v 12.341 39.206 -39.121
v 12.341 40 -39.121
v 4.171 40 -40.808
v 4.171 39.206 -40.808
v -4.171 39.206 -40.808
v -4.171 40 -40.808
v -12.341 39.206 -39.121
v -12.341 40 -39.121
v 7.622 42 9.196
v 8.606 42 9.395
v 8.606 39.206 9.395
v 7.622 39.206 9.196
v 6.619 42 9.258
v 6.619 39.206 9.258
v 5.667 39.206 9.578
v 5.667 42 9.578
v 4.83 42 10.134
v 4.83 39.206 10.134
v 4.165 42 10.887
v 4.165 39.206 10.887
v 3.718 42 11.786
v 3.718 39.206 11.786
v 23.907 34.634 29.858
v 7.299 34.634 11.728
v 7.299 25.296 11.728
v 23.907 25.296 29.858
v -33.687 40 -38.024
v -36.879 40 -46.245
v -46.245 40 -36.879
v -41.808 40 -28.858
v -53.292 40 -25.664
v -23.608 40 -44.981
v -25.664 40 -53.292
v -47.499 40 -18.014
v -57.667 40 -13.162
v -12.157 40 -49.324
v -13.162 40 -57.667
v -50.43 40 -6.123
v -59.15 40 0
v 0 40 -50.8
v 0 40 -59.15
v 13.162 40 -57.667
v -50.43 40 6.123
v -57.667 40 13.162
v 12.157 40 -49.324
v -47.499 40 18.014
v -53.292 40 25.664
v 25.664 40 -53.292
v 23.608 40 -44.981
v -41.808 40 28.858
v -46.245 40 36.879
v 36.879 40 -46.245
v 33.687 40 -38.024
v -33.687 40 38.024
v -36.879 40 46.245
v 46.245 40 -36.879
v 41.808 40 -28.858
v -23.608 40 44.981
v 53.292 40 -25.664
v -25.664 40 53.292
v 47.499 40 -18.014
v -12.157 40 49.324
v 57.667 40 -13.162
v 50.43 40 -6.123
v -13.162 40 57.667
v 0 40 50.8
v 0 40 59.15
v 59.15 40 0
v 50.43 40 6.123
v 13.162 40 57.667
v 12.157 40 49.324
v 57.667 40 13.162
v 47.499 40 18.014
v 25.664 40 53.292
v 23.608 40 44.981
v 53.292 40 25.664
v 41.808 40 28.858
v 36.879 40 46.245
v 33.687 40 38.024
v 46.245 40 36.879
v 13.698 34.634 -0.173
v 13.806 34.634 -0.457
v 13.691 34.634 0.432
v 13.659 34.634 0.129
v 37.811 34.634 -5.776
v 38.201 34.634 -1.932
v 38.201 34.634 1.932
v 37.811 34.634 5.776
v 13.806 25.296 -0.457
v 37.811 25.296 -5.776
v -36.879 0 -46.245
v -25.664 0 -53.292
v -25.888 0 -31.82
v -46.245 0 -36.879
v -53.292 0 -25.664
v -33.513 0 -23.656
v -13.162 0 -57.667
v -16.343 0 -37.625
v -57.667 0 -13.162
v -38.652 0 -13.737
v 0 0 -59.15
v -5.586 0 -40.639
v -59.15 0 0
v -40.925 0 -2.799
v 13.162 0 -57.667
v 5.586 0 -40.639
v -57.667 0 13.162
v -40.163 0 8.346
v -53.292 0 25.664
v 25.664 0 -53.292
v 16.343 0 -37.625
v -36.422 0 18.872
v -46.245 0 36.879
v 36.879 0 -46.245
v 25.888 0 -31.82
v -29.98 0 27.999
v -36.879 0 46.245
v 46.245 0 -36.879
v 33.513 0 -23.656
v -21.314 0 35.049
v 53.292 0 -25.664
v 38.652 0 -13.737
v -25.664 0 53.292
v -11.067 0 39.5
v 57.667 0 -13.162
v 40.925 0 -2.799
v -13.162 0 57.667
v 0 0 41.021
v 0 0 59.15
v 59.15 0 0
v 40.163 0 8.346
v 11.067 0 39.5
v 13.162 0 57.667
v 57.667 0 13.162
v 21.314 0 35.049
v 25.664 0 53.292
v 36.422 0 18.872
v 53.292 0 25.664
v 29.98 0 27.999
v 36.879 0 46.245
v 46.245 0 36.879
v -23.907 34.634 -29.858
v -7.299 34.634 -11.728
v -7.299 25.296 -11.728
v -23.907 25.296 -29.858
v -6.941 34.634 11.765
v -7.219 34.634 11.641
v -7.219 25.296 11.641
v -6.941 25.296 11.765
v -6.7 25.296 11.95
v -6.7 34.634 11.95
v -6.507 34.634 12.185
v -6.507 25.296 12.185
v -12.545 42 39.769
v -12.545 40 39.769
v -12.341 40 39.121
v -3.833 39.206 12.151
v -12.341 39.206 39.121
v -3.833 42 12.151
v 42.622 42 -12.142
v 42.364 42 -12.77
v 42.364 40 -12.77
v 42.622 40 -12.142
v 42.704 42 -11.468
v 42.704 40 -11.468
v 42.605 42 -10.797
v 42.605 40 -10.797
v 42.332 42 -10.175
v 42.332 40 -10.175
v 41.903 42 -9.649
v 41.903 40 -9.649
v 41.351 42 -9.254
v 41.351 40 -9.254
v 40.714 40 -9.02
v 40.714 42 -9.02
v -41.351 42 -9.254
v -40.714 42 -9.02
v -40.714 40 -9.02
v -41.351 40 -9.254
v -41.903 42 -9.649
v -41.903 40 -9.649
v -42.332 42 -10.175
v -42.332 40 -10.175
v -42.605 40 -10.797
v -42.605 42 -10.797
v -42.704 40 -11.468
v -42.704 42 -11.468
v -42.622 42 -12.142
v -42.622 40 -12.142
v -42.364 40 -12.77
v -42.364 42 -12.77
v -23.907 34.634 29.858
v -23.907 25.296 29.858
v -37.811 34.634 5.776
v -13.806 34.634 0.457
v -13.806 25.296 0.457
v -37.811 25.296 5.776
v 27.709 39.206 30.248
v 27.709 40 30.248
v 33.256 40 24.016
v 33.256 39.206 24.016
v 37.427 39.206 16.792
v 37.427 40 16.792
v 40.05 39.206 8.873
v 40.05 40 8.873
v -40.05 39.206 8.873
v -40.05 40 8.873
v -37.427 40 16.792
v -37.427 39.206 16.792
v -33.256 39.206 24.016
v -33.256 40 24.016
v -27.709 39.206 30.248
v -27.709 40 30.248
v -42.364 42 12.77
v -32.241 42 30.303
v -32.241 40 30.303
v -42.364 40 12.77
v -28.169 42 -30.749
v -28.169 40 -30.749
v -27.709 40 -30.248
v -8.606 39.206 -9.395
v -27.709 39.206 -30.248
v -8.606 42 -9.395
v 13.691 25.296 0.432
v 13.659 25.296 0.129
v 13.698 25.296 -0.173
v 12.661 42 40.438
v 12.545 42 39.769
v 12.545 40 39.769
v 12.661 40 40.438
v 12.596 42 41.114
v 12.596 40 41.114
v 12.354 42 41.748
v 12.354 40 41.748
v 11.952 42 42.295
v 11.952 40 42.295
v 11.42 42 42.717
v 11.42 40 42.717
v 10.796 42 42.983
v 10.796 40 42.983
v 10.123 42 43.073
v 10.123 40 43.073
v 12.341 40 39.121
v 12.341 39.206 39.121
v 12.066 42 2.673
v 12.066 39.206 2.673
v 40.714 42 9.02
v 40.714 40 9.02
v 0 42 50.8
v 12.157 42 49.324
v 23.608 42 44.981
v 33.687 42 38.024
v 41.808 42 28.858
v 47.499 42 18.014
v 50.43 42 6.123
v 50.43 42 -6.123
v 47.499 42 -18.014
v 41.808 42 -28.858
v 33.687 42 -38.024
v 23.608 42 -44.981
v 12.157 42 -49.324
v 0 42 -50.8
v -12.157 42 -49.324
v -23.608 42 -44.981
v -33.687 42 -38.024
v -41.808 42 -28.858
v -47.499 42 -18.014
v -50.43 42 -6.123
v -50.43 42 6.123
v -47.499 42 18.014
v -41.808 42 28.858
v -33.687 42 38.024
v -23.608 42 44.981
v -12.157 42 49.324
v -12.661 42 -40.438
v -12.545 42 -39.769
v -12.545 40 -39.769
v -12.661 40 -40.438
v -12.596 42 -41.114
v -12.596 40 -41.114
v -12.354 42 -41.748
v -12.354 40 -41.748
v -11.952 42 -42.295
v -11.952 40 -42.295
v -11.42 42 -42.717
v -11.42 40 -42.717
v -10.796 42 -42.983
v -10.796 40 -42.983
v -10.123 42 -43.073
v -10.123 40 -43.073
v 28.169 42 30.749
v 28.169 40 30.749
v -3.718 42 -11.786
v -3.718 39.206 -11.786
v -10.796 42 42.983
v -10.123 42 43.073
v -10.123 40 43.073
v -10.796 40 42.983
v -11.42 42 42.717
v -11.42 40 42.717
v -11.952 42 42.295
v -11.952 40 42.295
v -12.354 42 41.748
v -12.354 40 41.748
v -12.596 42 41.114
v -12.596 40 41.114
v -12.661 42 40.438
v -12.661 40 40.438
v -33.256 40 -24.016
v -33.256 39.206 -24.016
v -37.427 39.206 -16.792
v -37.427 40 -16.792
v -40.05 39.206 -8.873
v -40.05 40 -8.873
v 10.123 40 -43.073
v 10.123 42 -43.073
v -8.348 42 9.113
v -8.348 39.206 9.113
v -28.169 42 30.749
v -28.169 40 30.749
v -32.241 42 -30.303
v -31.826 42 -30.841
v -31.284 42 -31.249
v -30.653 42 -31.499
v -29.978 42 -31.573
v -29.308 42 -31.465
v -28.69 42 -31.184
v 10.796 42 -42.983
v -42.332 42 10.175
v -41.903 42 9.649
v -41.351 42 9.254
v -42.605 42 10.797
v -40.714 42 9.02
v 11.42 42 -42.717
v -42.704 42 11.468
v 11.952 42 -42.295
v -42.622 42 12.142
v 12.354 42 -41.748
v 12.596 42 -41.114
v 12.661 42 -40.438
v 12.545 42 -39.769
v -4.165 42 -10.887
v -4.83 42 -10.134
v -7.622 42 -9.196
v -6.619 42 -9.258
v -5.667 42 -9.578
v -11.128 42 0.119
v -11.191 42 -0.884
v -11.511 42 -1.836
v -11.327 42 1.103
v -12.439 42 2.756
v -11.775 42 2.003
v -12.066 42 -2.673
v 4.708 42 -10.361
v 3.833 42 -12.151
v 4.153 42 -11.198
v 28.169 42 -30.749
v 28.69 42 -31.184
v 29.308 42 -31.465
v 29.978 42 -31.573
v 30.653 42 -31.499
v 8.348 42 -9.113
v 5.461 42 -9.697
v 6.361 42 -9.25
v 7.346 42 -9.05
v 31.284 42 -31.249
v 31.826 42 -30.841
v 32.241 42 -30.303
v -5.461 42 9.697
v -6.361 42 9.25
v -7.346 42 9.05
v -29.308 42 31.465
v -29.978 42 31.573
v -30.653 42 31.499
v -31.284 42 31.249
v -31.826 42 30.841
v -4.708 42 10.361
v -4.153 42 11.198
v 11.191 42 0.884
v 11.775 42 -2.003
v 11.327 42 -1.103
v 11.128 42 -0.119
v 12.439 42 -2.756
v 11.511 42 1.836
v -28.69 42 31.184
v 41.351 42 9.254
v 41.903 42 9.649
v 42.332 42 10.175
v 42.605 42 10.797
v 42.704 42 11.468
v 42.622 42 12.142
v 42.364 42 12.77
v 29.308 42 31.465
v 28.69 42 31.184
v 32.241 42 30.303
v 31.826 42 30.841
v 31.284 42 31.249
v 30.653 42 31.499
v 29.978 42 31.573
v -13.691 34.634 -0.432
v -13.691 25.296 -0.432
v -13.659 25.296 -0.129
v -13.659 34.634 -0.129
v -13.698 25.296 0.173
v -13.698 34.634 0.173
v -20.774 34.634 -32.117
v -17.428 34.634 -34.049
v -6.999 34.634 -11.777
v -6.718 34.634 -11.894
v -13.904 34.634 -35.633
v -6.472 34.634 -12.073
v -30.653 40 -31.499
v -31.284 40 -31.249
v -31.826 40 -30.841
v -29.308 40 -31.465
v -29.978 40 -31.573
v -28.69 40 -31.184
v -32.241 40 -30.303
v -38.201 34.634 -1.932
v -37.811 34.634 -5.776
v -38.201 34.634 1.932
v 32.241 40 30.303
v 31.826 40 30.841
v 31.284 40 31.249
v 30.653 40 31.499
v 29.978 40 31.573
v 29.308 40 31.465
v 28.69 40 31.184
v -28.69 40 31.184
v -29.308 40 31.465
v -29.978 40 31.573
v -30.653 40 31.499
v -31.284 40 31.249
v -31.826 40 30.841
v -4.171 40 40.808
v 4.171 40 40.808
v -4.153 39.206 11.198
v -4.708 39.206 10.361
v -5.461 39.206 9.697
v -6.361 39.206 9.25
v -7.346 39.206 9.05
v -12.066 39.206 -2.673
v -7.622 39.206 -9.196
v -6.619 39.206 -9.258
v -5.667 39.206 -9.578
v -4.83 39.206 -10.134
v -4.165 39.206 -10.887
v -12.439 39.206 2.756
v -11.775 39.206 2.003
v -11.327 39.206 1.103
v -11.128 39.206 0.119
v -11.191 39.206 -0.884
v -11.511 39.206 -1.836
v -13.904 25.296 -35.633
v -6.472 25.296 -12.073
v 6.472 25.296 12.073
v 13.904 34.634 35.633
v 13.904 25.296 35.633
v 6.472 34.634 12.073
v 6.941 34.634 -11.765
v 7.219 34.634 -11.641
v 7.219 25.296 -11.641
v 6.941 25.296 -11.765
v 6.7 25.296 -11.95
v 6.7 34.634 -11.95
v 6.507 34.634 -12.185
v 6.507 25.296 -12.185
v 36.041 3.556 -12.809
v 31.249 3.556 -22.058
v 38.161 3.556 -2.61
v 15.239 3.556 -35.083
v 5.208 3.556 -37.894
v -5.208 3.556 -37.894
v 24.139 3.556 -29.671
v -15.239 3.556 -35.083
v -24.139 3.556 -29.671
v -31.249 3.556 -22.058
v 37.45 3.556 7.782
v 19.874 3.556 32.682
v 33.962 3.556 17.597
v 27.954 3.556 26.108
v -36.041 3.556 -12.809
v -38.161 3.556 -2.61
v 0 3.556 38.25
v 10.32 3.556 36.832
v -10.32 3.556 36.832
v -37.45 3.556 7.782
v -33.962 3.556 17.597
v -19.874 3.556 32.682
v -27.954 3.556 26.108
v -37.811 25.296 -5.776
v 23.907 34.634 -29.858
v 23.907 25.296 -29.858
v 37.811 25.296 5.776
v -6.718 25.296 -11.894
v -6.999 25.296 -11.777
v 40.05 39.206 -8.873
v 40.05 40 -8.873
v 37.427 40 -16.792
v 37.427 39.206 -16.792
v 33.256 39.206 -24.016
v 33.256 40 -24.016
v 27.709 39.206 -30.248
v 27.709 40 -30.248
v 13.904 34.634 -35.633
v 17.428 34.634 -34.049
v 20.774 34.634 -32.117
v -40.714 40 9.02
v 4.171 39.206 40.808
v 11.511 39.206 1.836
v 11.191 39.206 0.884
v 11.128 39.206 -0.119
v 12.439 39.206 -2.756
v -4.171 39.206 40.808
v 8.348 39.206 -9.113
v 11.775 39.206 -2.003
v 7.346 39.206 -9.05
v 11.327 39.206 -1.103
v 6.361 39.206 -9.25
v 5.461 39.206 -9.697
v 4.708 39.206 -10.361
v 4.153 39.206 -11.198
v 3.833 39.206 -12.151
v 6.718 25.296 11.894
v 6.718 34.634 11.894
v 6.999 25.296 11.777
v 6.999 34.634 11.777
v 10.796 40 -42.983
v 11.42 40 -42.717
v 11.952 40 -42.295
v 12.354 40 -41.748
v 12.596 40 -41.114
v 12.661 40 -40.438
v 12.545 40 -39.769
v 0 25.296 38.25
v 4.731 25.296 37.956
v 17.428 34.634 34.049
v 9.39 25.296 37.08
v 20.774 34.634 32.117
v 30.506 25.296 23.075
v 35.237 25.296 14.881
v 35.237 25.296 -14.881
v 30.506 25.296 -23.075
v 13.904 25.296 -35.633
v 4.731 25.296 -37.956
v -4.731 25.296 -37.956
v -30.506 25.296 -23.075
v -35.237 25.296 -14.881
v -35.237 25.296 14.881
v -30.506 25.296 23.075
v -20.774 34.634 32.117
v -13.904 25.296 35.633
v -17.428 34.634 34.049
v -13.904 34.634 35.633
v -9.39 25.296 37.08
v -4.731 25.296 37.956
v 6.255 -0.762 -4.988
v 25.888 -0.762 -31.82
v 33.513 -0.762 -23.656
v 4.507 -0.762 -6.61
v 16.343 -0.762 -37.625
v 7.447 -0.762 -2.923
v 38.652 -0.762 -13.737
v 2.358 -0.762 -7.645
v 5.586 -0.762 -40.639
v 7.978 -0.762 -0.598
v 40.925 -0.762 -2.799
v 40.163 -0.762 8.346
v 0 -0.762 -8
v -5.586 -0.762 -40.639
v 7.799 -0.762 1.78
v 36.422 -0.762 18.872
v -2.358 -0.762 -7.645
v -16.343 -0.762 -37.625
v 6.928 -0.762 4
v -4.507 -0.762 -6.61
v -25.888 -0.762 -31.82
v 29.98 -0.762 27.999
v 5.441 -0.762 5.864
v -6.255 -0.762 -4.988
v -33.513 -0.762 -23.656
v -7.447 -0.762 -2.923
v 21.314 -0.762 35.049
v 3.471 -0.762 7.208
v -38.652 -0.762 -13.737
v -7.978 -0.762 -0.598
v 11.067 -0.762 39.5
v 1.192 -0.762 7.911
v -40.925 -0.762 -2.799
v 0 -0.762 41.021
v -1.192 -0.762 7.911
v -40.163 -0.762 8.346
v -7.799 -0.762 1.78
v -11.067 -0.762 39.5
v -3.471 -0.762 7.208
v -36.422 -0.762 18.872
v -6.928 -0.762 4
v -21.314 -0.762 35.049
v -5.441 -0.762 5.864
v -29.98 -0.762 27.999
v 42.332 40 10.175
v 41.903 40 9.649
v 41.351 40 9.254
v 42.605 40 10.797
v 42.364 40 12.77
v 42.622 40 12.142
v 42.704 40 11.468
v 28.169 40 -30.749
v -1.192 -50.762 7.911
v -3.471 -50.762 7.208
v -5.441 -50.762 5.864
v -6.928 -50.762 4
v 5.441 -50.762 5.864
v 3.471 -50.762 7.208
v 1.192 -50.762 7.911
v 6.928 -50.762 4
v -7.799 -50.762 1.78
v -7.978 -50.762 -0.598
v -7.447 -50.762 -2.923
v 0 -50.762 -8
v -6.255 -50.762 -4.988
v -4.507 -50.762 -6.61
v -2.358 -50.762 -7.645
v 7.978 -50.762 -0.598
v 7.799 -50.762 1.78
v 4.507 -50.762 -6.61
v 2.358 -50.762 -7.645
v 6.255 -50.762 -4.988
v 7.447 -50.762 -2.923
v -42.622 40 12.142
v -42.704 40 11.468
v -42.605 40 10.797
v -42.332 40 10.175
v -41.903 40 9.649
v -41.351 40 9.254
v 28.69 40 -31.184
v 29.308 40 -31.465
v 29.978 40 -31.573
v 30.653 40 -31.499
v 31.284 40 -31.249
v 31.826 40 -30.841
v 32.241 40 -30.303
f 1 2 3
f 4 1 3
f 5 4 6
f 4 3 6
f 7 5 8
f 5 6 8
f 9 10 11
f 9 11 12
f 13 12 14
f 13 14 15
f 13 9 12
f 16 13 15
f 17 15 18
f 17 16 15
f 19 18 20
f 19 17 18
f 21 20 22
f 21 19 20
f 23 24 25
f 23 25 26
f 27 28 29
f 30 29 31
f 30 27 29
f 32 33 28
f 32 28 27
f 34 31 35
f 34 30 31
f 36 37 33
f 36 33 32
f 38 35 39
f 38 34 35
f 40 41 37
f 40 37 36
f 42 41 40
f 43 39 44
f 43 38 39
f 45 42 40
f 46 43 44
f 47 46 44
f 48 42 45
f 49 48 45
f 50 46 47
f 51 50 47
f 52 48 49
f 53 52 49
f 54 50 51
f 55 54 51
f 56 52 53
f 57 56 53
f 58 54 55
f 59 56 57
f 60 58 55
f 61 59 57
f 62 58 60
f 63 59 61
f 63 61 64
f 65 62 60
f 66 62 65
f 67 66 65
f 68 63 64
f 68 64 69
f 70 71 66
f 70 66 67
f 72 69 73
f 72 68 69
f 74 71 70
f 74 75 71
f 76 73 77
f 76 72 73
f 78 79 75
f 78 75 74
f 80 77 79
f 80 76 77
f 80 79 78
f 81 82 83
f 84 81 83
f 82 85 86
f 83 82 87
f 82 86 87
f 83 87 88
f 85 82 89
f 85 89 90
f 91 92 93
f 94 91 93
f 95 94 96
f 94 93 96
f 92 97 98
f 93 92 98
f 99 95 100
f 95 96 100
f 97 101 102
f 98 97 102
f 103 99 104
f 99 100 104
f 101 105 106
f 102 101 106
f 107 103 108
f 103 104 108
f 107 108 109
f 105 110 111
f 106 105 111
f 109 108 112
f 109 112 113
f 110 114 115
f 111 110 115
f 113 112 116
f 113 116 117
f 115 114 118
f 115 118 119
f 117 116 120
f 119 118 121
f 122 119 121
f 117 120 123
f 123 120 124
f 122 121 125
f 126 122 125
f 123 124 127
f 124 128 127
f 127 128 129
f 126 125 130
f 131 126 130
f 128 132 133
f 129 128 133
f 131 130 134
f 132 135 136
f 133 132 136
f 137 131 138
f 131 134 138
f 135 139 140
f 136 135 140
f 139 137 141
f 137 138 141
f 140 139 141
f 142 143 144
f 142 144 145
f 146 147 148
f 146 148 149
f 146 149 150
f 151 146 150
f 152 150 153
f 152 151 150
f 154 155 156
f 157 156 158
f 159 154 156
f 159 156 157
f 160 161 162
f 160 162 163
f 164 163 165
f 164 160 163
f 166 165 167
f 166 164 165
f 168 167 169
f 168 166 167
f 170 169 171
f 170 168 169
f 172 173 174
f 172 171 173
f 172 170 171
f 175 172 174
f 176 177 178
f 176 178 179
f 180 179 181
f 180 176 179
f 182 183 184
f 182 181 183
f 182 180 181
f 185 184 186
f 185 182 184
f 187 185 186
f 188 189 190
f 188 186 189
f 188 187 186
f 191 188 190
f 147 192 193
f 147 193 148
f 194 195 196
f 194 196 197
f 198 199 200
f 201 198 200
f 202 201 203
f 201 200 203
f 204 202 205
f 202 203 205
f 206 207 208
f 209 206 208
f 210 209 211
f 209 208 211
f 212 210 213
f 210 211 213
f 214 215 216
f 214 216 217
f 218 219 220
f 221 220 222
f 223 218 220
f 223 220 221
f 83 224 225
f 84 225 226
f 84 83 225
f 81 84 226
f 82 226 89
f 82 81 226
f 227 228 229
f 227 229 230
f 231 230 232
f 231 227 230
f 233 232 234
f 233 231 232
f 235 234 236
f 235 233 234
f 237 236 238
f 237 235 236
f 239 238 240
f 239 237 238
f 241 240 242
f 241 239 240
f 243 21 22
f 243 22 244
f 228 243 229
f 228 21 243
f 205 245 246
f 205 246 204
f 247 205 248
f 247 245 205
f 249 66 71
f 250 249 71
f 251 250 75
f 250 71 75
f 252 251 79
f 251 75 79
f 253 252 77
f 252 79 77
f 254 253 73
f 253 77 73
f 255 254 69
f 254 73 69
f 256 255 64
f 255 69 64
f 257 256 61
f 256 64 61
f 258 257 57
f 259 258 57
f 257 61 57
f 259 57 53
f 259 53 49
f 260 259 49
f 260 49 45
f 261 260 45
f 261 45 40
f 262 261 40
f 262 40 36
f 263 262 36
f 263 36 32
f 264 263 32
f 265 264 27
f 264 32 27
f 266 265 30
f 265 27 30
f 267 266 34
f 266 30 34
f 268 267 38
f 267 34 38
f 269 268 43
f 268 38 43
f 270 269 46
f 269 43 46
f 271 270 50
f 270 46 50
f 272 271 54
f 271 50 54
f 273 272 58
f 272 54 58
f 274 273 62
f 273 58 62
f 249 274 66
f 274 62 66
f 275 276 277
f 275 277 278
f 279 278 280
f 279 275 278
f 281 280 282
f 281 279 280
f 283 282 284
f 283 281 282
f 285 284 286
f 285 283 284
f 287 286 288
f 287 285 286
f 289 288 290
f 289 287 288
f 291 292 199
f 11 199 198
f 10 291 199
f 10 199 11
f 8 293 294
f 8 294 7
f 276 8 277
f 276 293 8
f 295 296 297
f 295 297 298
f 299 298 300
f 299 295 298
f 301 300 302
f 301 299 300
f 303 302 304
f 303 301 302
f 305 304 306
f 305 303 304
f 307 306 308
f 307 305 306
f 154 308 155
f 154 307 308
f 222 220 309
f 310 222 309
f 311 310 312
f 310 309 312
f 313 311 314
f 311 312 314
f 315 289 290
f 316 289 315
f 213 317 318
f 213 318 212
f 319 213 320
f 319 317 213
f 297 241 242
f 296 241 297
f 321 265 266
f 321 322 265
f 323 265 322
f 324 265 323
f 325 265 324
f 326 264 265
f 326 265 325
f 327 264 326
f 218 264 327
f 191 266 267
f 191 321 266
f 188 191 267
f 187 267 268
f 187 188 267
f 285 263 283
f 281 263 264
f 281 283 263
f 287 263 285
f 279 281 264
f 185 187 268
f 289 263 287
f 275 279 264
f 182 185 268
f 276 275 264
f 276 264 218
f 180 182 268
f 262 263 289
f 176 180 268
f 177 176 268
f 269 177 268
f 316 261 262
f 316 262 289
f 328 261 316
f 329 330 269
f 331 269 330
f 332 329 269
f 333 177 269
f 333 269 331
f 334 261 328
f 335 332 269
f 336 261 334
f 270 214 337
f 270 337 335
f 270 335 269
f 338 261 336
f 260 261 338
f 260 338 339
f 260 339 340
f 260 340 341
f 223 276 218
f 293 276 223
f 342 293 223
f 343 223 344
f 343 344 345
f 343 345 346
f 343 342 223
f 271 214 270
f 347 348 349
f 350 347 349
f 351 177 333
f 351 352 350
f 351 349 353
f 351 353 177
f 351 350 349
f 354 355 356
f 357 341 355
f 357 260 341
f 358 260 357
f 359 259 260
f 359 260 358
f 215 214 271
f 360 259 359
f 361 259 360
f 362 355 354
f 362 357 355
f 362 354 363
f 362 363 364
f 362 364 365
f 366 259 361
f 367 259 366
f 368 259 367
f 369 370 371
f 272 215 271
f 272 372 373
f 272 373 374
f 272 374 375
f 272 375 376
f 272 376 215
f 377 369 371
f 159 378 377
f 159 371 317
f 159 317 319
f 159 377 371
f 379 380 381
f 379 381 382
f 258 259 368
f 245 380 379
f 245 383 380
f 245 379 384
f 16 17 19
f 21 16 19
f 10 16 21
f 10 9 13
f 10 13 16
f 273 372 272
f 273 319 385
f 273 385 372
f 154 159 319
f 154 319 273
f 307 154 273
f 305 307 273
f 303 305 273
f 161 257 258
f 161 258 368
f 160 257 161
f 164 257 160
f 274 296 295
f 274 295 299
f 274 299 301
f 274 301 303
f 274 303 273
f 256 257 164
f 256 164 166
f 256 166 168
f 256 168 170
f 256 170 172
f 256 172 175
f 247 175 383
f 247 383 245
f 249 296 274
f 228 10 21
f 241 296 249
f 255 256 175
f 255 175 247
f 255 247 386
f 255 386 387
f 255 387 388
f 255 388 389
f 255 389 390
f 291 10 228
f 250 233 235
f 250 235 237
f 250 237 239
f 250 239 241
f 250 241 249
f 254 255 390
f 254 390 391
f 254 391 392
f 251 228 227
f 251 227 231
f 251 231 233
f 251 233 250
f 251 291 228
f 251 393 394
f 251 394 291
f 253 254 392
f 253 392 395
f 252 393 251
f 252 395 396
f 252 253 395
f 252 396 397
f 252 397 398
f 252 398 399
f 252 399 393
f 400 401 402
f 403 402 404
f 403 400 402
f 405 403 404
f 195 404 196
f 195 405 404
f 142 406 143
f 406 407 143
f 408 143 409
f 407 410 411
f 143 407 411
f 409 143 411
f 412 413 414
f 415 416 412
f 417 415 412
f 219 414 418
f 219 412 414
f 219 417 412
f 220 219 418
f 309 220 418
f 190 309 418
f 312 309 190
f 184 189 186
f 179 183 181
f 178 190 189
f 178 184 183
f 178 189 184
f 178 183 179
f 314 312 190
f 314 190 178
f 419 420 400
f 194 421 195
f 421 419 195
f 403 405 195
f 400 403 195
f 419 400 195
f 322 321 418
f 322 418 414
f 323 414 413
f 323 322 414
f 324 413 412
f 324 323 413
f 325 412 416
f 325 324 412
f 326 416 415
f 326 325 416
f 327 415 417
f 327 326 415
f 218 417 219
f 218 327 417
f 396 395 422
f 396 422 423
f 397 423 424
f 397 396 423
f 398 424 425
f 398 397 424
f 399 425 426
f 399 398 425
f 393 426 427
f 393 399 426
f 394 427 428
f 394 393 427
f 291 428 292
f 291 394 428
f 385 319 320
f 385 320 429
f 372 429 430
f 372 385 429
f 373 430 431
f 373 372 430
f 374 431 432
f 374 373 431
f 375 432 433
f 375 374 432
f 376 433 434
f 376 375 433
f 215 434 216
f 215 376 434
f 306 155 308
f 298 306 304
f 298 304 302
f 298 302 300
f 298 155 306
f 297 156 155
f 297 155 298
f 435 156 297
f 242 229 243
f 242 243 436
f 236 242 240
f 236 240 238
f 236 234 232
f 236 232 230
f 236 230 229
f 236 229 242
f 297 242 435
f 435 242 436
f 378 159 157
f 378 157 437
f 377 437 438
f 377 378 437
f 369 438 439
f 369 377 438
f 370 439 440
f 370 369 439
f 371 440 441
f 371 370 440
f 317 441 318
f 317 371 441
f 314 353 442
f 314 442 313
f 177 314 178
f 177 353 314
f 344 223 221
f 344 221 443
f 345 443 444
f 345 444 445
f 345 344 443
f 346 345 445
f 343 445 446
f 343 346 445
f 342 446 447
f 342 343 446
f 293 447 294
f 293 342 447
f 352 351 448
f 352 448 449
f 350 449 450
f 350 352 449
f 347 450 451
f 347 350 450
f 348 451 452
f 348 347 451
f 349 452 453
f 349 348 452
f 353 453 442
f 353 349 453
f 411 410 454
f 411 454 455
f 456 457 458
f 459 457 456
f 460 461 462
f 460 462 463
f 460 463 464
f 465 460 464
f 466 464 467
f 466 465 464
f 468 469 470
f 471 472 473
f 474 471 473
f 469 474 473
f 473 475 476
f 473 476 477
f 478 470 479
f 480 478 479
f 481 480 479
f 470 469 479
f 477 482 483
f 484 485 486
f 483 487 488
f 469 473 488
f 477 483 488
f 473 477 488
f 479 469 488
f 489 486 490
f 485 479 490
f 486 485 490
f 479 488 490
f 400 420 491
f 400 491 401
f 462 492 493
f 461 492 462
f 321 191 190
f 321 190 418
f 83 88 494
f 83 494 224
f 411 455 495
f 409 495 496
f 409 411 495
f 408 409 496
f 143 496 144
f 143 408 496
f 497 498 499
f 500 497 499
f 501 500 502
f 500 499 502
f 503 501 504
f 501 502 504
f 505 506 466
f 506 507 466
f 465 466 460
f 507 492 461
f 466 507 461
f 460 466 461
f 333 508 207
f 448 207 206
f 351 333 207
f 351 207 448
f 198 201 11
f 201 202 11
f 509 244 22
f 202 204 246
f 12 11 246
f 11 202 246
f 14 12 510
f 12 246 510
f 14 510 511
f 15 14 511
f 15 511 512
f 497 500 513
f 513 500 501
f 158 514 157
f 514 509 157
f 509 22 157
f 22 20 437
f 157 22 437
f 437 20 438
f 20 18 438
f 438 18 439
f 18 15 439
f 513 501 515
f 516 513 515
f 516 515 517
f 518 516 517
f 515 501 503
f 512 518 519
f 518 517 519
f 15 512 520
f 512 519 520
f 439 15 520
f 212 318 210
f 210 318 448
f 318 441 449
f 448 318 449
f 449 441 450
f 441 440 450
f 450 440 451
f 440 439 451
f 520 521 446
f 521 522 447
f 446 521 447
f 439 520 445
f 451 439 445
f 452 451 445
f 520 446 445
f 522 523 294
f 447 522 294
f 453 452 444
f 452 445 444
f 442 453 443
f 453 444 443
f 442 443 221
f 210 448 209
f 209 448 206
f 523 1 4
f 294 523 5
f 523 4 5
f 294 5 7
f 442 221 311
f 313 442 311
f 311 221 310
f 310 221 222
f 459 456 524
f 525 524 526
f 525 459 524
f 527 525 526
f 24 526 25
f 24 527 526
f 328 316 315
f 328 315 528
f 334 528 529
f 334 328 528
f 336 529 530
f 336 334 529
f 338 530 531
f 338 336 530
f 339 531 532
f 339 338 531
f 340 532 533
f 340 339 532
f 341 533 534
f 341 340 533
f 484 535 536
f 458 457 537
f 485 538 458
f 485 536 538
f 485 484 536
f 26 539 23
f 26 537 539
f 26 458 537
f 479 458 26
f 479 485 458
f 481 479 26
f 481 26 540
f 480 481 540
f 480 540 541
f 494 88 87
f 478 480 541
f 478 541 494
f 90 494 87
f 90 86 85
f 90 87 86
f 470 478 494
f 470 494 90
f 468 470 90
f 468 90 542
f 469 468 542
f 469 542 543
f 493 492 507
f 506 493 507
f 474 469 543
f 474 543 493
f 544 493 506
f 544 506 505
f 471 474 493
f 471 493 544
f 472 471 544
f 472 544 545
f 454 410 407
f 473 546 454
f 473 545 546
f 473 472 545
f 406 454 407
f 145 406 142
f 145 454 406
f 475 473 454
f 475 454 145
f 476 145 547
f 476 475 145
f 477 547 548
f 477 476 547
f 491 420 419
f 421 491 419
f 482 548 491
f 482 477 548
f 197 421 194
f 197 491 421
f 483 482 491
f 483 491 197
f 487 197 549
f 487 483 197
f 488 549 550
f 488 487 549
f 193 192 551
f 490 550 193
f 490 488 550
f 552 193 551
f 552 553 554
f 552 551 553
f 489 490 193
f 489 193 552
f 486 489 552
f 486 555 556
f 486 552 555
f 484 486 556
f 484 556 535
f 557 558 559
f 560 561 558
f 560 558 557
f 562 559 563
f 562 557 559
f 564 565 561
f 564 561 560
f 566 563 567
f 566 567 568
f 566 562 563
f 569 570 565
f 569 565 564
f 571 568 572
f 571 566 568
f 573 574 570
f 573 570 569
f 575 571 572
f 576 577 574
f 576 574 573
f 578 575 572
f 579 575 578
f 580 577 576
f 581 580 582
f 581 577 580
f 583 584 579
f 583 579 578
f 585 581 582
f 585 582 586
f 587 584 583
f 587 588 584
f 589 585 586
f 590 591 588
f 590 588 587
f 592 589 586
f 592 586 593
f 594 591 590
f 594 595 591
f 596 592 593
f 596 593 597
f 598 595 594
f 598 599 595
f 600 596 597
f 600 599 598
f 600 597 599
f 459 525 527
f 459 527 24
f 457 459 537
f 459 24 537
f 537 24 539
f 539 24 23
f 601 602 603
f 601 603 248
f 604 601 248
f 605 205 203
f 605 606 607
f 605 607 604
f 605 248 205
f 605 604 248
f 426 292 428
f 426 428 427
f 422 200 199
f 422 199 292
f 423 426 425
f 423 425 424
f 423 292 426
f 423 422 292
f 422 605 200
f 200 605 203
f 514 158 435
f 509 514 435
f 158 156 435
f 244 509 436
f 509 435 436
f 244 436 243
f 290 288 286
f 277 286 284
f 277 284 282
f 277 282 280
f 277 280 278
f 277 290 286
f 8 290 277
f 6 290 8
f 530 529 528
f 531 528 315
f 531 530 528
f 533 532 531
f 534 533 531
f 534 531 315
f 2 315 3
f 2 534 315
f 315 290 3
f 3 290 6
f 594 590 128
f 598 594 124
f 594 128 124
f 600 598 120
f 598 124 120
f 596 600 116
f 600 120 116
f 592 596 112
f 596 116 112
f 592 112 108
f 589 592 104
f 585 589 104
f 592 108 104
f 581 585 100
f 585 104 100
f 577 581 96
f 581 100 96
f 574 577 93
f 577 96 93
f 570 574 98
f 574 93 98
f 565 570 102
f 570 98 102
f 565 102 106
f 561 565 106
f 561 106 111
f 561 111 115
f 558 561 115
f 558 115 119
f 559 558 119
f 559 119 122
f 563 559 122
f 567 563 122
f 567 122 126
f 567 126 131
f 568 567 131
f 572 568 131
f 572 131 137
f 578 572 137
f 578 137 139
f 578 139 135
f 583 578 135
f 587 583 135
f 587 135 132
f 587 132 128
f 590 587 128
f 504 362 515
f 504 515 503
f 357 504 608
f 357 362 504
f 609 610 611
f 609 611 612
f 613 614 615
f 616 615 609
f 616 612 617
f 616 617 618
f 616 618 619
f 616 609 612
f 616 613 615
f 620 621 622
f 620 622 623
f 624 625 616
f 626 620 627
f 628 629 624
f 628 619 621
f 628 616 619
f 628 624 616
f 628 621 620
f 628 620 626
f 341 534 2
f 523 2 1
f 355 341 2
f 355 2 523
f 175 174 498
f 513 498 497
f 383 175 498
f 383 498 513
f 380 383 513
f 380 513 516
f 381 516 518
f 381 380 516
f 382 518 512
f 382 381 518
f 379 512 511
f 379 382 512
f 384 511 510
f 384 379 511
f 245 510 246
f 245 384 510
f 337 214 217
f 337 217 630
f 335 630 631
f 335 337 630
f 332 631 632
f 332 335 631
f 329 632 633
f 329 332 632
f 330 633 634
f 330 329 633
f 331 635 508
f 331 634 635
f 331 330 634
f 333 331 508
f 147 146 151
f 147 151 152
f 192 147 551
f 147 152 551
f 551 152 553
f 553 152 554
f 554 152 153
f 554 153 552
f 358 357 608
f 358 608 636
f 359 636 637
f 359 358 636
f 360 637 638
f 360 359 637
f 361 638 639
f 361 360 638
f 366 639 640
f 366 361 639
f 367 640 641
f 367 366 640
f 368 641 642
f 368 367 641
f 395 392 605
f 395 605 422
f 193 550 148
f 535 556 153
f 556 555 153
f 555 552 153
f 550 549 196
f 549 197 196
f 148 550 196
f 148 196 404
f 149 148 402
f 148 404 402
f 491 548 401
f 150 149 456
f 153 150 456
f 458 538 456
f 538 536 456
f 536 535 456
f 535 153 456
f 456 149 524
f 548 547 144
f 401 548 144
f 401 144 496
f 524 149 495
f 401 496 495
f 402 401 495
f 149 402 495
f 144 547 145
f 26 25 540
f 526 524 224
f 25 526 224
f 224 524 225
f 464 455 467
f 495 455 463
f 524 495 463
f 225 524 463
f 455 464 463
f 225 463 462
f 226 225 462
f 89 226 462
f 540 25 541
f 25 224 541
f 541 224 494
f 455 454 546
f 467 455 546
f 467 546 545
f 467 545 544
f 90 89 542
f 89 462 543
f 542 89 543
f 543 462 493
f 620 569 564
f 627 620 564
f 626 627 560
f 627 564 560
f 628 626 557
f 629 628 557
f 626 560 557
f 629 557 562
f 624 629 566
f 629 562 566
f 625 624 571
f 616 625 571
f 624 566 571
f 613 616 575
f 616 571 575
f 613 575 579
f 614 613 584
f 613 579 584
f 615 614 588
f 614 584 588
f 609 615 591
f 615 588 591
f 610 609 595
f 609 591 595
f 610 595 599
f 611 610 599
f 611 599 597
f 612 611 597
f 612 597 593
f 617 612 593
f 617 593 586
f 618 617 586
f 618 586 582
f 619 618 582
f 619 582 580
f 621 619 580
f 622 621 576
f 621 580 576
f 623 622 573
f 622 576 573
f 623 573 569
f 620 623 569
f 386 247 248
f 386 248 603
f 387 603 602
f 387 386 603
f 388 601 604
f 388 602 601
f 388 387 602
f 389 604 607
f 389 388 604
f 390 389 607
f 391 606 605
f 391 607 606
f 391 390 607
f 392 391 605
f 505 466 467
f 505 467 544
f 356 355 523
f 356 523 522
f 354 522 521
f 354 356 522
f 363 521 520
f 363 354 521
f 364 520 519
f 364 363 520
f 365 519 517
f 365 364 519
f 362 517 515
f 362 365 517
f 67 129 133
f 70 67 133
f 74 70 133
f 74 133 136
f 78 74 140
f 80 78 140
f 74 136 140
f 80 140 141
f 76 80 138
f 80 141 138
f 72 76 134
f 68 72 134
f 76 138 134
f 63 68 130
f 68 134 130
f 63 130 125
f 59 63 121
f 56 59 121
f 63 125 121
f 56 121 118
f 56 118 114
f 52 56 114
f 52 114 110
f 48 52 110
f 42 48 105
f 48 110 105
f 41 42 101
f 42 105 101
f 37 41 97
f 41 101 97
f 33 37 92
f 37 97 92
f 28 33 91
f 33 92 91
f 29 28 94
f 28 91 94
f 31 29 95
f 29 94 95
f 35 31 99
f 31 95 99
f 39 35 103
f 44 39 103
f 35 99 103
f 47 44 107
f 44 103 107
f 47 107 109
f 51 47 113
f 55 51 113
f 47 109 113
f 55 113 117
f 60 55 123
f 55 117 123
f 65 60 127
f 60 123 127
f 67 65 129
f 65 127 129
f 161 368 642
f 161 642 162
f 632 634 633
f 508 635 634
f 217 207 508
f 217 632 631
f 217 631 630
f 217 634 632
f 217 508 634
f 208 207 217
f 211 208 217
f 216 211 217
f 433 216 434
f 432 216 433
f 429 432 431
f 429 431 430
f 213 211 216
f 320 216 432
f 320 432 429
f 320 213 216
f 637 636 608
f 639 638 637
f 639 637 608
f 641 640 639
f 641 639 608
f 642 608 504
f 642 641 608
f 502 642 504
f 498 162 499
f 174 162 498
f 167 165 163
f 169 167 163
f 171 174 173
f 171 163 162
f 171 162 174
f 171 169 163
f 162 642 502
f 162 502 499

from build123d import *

# Parameters (mm, degrees)
SKETCH3_R           = 59.15
SKETCH3_R_2         = 38.25
BOSS_EXTRUDE1_DEPTH = 40
SKETCH4_R           = 41.021
CUT_EXTRUDE1_DEPTH  = 3.556
SKETCH5_R           = 50.8
BOSS_EXTRUDE2_DEPTH = 2
SKETCH7_R           = 44.45
BOSS_EXTRUDE3_DEPTH = 7.366
CUT_EXTRUDE2_DEPTH  = 2.794
BOSS_EXTRUDE5_DEPTH = 13.91
SKETCH11_R          = 41.021
BOSS_EXTRUDE6_DEPTH = 4.318
SKETCH12_R          = 8
BOSS_EXTRUDE7_DEPTH = 50


with BuildPart() as part:
    # Sketch3 → Boss-Extrude1 (new body)
    with BuildSketch(Plane(origin=(0, 0, 0), x_dir=(1, 0, 0), z_dir=(0, 1, 0))):
        with Locations(Location((0, 0, 0), (0, 0, 270))):
            Circle(SKETCH3_R)
        with Locations(Location((0, 0, 0), (0, 0, 270))):
            Circle(SKETCH3_R_2, mode=Mode.SUBTRACT)
    extrude(amount=BOSS_EXTRUDE1_DEPTH)

    # Sketch4 → Cut-Extrude1 (cut)
    with BuildSketch(Plane(origin=(0, 40, 0), x_dir=(1, 0, 0), z_dir=(0, 1, 0))):
        with Locations(Location((0, 0, 0), (0, 0, 270))):
            Circle(SKETCH4_R)
    cut_extrude1 = extrude(amount=-CUT_EXTRUDE1_DEPTH, mode=Mode.SUBTRACT)

    # Mirror1: Cut-Extrude1 across plane
    add(cut_extrude1.mirror(Plane.ZX.offset(20)), mode=Mode.SUBTRACT)



with BuildPart() as body_2:
    # Sketch5 → Boss-Extrude2 (new body)
    with BuildSketch(Plane(origin=(0, 40, 0), x_dir=(1, 0, 0), z_dir=(0, 1, 0))):
        with Locations(Location((0, 0, 0), (0, 0, 270))):
            Circle(SKETCH5_R)
    extrude(amount=BOSS_EXTRUDE2_DEPTH)

    # Sketch7 → Boss-Extrude3 (add)
    with BuildSketch(Plane(origin=(0, 42, 0), x_dir=(1, 0, 0), z_dir=(0, 1, 0))):
        with Locations(Location((0, 0, 0), (0, 0, 270))):
            Circle(SKETCH7_R)
    extrude(amount=-BOSS_EXTRUDE3_DEPTH)

    # Sketch8 → Cut-Extrude2 (cut)
    with BuildSketch(Plane(origin=(0, 42, 0), x_dir=(1, 0, 0), z_dir=(0, 1, 0))):
        with BuildLine():
            Line((-3.717986915, 11.786271444), (-12.545239758, 39.769263451))
            ThreePointArc((-12.545239758, 39.769263451), (-12.171377231, 42.035175802), (-10.12290422, 43.073390757))
            Line((-10.12290422, 43.073390757), (10.12290422, 43.073390757))
            ThreePointArc((10.12290422, 43.073390757), (12.171377231, 42.035175802), (12.545239758, 39.769263451))
            Line((12.545239758, 39.769263451), (3.832946747, 12.150701932))
            ThreePointArc((3.832946747, 12.150701932), (5.461454635, 9.696711292), (8.348217029, 9.113006841))
            Line((8.348217029, 9.113006841), (28.16857256, 30.749128053))
            ThreePointArc((28.16857256, 30.749128053), (30.317841482, 31.558309782), (32.241198512, 30.303387593))
            Line((32.241198512, 30.303387593), (42.364102732, 12.770003164))
            ThreePointArc((42.364102732, 12.770003164), (42.489218712, 10.47686602), (40.713812318, 9.020135398))
            Line((40.713812318, 9.020135398), (12.43928992, 2.755921712))
            ThreePointArc((12.43928992, 2.755921712), (11.12832563, 0.11859719), (12.066203944, -2.673264603))
            Line((12.066203944, -2.673264603), (40.713812318, -9.020135398))
            ThreePointArc((40.713812318, -9.020135398), (42.489218712, -10.47686602), (42.364102732, -12.770003164))
            Line((42.364102732, -12.770003164), (32.241198512, -30.303387593))
            ThreePointArc((32.241198512, -30.303387593), (30.317841482, -31.558309782), (28.16857256, -30.749128053))
            Line((28.16857256, -30.749128053), (8.606343173, -9.39478022))
            ThreePointArc((8.606343173, -9.39478022), (5.666870994, -9.578114102), (3.717986915, -11.786271444))
            Line((3.717986915, -11.786271444), (12.545239758, -39.769263451))
            ThreePointArc((12.545239758, -39.769263451), (12.171377231, -42.035175802), (10.12290422, -43.073390757))
            Line((10.12290422, -43.073390757), (-10.12290422, -43.073390757))
            ThreePointArc((-10.12290422, -43.073390757), (-12.171377231, -42.035175802), (-12.545239758, -39.769263451))
            Line((-12.545239758, -39.769263451), (-3.832946747, -12.150701932))
            ThreePointArc((-3.832946747, -12.150701932), (-5.461454635, -9.696711292), (-8.348217029, -9.113006841))
            Line((-8.348217029, -9.113006841), (-28.16857256, -30.749128053))
            ThreePointArc((-28.16857256, -30.749128053), (-30.317841482, -31.558309782), (-32.241198512, -30.303387593))
            Line((-32.241198512, -30.303387593), (-42.364102732, -12.770003164))
            ThreePointArc((-42.364102732, -12.770003164), (-42.489218712, -10.47686602), (-40.713812318, -9.020135398))
            Line((-40.713812318, -9.020135398), (-12.43928992, -2.755921712))
            ThreePointArc((-12.43928992, -2.755921712), (-11.12832563, -0.11859719), (-12.066203944, 2.673264603))
            Line((-12.066203944, 2.673264603), (-40.713812318, 9.020135398))
            ThreePointArc((-40.713812318, 9.020135398), (-42.489218712, 10.47686602), (-42.364102732, 12.770003164))
            Line((-42.364102732, 12.770003164), (-32.241198512, 30.303387593))
            ThreePointArc((-32.241198512, 30.303387593), (-30.317841482, 31.558309782), (-28.16857256, 30.749128053))
            Line((-28.16857256, 30.749128053), (-8.606343173, 9.39478022))
            ThreePointArc((-8.606343173, 9.39478022), (-5.666870994, 9.578114102), (-3.717986915, 11.786271444))
        make_face()
    extrude(amount=-CUT_EXTRUDE2_DEPTH, mode=Mode.SUBTRACT)


with BuildPart() as part_1:
    add(part.part)

    add(body_2.part)  # Boss-Extrude5 merges body 2
    # Sketch10 → Boss-Extrude5 (add)
    with BuildSketch(Plane(origin=(0, 39.206, 0), x_dir=(1, 0, 0), z_dir=(0, 1, 0))):
        with BuildLine():
            Line((10.12290422, 45.613390757), (-10.12290422, 45.613390757))
            ThreePointArc((-10.12290422, 45.613390757), (-14.219850242, 43.536960847), (-14.967575297, 39.005136146))
            Line((-14.967575297, 39.005136146), (-6.471688132, 12.072595881))
            ThreePointArc((-6.471688132, 12.072595881), (-6.854928199, 11.827206148), (-7.29904471, 11.727961017))
            Line((-7.29904471, 11.727961017), (-26.295651132, 32.464868513))
            ThreePointArc((-26.295651132, 32.464868513), (-30.594188976, 34.083231971), (-34.440903038, 31.573387593))
            Line((-34.440903038, 31.573387593), (-44.563807258, 14.040003164))
            ThreePointArc((-44.563807258, 14.040003164), (-44.814039218, 9.453728876), (-41.263226429, 6.540267633))
            Line((-41.263226429, 6.540267633), (-13.691018788, 0.431651613))
            ThreePointArc((-13.691018788, 0.431651613), (-13.67012508, -0.022938888), (-13.80623453, -0.457177633))
            Line((-13.80623453, -0.457177633), (-41.263226429, -6.540267633))
            ThreePointArc((-41.263226429, -6.540267633), (-44.814039218, -9.453728876), (-44.563807258, -14.040003164))
            Line((-44.563807258, -14.040003164), (-34.440903038, -31.573387593))
            ThreePointArc((-34.440903038, -31.573387593), (-30.594188976, -34.083231971), (-26.295651132, -32.464868513))
            Line((-26.295651132, -32.464868513), (-7.219330657, -11.640944268))
            ThreePointArc((-7.219330657, -11.640944268), (-6.81519688, -11.850145036), (-6.507189821, -12.185138651))
            Line((-6.507189821, -12.185138651), (-14.967575297, -39.005136146))
            ThreePointArc((-14.967575297, -39.005136146), (-14.219850242, -43.536960847), (-10.12290422, -45.613390757))
            Line((-10.12290422, -45.613390757), (10.12290422, -45.613390757))
            ThreePointArc((10.12290422, -45.613390757), (14.219850242, -43.536960847), (14.967575297, -39.005136146))
            Line((14.967575297, -39.005136146), (6.471688132, -12.072595881))
            ThreePointArc((6.471688132, -12.072595881), (6.854928199, -11.827206148), (7.29904471, -11.727961017))
            Line((7.29904471, -11.727961017), (26.295651132, -32.464868513))
            ThreePointArc((26.295651132, -32.464868513), (30.594188976, -34.083231971), (34.440903038, -31.573387593))
            Line((34.440903038, -31.573387593), (44.563807258, -14.040003164))
            ThreePointArc((44.563807258, -14.040003164), (44.814039218, -9.453728876), (41.263226429, -6.540267633))
            Line((41.263226429, -6.540267633), (13.691018788, -0.431651613))
            ThreePointArc((13.691018788, -0.431651613), (13.67012508, 0.022938888), (13.80623453, 0.457177633))
            Line((13.80623453, 0.457177633), (41.263226429, 6.540267633))
            ThreePointArc((41.263226429, 6.540267633), (44.814039218, 9.453728876), (44.563807258, 14.040003164))
            Line((44.563807258, 14.040003164), (34.440903038, 31.573387593))
            ThreePointArc((34.440903038, 31.573387593), (30.594188976, 34.083231971), (26.295651132, 32.464868513))
            Line((26.295651132, 32.464868513), (7.219330657, 11.640944268))
            ThreePointArc((7.219330657, 11.640944268), (6.81519688, 11.850145036), (6.507189821, 12.185138651))
            Line((6.507189821, 12.185138651), (14.967575297, 39.005136146))
            ThreePointArc((14.967575297, 39.005136146), (14.219850242, 43.536960847), (10.12290422, 45.613390757))
        make_face()
    extrude(amount=-BOSS_EXTRUDE5_DEPTH)

    # Sketch11 → Boss-Extrude6 (add)
    with BuildSketch(Plane.XZ.offset(-3.556)):
        with Locations(Location((0, 0, 0), (0, 0, 90))):
            Circle(SKETCH11_R)
    extrude(amount=BOSS_EXTRUDE6_DEPTH)

    # Sketch12 → Boss-Extrude7 (add)
    with BuildSketch(Plane.XZ.offset(0.762)):
        with Locations(Location((0, 0, 0), (0, 0, 270))):
            Circle(SKETCH12_R)
    extrude(amount=BOSS_EXTRUDE7_DEPTH)


solid = part_1.part
